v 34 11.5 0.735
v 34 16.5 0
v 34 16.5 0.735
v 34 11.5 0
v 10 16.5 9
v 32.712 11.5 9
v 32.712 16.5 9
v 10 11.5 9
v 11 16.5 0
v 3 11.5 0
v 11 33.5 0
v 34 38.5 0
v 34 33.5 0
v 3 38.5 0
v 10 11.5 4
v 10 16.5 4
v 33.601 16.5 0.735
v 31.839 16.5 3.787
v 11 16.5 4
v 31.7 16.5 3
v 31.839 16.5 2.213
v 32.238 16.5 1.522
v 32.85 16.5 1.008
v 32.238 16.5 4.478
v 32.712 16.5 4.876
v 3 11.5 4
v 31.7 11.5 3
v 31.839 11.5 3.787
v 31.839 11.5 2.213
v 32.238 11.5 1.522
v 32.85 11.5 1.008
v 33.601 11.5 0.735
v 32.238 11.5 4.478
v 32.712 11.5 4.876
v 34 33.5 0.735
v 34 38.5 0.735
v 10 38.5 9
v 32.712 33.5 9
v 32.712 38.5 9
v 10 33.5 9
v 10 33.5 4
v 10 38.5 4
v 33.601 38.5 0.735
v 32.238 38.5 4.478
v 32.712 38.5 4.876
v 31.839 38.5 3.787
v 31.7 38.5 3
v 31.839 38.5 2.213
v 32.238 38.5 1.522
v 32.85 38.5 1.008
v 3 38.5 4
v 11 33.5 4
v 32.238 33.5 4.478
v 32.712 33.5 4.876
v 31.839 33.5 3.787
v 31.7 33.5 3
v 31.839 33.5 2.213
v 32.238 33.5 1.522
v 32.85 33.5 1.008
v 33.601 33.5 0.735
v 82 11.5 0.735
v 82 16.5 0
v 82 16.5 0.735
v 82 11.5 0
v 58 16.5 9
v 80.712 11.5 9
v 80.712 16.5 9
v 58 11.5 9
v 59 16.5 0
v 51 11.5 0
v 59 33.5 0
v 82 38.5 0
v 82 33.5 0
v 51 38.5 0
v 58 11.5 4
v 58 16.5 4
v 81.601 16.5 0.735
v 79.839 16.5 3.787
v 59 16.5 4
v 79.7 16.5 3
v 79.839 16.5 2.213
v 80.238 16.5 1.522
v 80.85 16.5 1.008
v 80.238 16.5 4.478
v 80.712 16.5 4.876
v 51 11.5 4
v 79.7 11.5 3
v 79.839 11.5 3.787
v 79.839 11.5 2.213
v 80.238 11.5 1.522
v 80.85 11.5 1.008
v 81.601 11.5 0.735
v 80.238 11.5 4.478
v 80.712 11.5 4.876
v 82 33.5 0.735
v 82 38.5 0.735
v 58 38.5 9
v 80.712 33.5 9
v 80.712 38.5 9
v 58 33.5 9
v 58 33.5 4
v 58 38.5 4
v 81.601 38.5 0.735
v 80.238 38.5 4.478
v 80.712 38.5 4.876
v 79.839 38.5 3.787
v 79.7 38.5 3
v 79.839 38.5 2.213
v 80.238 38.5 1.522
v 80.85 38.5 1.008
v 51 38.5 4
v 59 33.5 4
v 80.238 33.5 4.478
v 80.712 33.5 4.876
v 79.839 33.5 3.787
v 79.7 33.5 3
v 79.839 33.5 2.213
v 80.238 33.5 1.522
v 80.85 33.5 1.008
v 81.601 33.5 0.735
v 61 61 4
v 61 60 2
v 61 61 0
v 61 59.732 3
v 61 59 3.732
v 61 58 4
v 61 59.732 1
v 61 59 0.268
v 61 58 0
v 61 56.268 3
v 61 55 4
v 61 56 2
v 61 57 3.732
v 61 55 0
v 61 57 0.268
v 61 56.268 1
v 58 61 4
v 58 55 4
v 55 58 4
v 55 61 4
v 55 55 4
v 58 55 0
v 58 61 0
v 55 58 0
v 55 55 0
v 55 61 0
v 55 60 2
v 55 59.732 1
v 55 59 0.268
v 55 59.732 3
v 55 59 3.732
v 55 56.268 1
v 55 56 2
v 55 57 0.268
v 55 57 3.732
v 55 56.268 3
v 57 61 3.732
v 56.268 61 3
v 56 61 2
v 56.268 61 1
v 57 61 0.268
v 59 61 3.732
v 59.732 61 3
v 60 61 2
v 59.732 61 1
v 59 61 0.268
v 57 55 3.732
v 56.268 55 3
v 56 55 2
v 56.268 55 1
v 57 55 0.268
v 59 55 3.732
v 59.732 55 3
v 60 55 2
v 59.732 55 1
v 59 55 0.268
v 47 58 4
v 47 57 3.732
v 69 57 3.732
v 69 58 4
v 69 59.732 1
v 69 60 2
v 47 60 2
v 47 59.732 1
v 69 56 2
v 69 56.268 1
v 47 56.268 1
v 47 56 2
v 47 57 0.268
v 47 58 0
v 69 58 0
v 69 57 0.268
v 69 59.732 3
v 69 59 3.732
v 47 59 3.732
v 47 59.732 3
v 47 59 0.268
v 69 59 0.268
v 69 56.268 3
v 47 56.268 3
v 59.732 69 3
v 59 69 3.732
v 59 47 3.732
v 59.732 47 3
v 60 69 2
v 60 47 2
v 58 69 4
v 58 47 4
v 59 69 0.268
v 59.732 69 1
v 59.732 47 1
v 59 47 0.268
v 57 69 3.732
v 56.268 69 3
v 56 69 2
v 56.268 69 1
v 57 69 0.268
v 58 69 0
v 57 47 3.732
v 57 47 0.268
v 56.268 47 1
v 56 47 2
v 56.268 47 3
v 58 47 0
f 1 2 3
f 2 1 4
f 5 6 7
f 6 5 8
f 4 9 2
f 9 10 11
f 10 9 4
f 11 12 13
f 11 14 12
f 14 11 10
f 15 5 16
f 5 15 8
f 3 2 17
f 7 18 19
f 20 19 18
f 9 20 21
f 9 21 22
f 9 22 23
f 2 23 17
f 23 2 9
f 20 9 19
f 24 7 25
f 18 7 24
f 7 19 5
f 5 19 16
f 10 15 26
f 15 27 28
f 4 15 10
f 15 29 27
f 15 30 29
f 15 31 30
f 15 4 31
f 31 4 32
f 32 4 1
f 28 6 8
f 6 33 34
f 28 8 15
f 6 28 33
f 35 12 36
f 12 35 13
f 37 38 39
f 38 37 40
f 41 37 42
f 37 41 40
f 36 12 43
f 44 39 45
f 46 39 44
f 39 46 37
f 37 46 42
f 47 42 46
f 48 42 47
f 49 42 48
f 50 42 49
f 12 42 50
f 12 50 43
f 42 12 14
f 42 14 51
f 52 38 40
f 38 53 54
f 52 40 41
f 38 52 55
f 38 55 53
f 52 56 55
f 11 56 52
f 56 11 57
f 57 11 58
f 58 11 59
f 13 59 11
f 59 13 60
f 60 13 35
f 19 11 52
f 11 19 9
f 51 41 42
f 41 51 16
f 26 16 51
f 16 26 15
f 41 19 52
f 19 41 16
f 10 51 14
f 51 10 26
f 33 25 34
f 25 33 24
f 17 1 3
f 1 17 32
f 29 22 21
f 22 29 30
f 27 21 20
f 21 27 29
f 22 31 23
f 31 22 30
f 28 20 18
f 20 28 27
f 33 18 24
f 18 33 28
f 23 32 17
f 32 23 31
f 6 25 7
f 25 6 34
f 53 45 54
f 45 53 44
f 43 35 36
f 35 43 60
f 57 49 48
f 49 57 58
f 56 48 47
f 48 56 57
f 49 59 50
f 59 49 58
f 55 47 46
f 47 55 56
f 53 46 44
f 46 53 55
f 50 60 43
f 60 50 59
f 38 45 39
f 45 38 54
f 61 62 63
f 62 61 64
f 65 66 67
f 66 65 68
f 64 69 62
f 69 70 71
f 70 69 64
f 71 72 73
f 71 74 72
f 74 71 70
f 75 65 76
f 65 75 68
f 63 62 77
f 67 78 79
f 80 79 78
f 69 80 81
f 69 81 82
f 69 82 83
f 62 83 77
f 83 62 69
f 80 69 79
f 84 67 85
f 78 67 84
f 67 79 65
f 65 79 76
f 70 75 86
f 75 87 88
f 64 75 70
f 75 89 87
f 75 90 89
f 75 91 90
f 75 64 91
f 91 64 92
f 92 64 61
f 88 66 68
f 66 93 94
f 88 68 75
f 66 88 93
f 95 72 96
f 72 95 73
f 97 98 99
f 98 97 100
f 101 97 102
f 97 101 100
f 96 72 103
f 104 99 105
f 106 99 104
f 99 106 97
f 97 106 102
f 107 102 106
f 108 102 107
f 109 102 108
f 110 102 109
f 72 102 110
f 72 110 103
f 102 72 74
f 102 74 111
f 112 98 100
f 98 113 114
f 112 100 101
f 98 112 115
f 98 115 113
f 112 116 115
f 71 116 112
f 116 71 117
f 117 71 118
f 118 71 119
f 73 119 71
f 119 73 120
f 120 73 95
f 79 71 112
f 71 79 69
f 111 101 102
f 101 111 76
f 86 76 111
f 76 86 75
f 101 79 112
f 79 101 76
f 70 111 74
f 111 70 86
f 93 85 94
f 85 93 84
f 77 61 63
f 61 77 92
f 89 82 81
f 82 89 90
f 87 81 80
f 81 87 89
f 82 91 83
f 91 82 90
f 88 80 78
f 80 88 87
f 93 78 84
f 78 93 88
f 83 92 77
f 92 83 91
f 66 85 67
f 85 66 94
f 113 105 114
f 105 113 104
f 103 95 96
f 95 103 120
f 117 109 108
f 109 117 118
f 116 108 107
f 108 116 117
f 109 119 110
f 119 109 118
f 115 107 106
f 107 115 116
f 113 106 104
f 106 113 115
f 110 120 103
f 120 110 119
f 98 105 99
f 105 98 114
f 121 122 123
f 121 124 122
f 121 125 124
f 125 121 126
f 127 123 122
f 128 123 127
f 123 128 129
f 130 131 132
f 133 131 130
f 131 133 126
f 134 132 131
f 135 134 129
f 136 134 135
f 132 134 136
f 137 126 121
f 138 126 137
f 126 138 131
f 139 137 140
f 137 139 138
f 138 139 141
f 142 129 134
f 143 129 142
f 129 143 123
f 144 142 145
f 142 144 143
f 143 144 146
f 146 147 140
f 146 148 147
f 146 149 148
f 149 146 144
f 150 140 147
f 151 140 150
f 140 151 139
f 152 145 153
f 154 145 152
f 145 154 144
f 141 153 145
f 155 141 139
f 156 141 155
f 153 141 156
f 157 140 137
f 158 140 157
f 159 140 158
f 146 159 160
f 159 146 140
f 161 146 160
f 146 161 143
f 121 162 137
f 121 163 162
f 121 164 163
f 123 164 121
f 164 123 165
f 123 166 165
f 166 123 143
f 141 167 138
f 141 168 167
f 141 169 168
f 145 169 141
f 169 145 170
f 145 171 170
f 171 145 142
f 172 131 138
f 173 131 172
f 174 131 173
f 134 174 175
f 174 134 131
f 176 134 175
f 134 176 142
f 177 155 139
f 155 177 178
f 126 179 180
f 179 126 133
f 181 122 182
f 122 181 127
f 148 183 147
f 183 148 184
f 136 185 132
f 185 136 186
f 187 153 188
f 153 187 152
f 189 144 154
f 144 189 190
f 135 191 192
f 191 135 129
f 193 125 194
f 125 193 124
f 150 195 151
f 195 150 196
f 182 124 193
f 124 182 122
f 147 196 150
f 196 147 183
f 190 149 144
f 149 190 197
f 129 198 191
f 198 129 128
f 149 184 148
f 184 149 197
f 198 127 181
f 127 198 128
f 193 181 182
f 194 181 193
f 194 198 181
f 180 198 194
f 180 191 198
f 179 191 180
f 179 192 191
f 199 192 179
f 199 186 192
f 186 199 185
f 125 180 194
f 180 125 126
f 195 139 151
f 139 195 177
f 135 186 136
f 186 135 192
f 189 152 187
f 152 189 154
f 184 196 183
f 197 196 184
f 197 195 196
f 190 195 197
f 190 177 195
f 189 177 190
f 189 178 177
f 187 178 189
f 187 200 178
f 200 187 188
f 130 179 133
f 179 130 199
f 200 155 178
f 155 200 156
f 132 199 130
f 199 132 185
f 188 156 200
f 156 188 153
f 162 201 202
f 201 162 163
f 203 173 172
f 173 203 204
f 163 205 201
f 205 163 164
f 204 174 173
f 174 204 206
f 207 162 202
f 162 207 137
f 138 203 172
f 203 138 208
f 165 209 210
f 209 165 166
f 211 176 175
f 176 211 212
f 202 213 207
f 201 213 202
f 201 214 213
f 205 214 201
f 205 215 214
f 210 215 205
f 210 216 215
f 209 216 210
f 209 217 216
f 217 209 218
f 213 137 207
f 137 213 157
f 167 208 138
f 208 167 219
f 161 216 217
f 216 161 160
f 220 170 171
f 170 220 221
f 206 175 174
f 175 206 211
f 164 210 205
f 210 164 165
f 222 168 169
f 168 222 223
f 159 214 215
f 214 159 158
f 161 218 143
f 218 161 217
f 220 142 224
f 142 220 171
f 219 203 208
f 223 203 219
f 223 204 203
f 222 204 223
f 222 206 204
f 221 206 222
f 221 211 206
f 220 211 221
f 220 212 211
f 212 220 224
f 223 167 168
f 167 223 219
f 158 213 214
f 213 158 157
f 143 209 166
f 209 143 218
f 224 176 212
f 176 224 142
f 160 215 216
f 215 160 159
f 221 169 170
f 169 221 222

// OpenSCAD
/*
Sample 018: Schnapp-Kardangelenk — standard
Generated from the FDM Mechanical Sample Library.
Units: millimetres.

Override examples:
  openscad -o custom.stl -D 'view="plate"' -D 'render_fn=64' model.scad
  openscad -o preview.png -D 'view="assembly"' model.scad
*/
use <../../../library/fdm_mechanisms.scad>

render_fn = is_undef(render_fn) ? 48 : render_fn;
view = is_undef(view) ? "plate" : view;
$fn = render_fn;

sample_universal_joint(
    view=view,
    clearance=0.3,
    pin_d=4
);
